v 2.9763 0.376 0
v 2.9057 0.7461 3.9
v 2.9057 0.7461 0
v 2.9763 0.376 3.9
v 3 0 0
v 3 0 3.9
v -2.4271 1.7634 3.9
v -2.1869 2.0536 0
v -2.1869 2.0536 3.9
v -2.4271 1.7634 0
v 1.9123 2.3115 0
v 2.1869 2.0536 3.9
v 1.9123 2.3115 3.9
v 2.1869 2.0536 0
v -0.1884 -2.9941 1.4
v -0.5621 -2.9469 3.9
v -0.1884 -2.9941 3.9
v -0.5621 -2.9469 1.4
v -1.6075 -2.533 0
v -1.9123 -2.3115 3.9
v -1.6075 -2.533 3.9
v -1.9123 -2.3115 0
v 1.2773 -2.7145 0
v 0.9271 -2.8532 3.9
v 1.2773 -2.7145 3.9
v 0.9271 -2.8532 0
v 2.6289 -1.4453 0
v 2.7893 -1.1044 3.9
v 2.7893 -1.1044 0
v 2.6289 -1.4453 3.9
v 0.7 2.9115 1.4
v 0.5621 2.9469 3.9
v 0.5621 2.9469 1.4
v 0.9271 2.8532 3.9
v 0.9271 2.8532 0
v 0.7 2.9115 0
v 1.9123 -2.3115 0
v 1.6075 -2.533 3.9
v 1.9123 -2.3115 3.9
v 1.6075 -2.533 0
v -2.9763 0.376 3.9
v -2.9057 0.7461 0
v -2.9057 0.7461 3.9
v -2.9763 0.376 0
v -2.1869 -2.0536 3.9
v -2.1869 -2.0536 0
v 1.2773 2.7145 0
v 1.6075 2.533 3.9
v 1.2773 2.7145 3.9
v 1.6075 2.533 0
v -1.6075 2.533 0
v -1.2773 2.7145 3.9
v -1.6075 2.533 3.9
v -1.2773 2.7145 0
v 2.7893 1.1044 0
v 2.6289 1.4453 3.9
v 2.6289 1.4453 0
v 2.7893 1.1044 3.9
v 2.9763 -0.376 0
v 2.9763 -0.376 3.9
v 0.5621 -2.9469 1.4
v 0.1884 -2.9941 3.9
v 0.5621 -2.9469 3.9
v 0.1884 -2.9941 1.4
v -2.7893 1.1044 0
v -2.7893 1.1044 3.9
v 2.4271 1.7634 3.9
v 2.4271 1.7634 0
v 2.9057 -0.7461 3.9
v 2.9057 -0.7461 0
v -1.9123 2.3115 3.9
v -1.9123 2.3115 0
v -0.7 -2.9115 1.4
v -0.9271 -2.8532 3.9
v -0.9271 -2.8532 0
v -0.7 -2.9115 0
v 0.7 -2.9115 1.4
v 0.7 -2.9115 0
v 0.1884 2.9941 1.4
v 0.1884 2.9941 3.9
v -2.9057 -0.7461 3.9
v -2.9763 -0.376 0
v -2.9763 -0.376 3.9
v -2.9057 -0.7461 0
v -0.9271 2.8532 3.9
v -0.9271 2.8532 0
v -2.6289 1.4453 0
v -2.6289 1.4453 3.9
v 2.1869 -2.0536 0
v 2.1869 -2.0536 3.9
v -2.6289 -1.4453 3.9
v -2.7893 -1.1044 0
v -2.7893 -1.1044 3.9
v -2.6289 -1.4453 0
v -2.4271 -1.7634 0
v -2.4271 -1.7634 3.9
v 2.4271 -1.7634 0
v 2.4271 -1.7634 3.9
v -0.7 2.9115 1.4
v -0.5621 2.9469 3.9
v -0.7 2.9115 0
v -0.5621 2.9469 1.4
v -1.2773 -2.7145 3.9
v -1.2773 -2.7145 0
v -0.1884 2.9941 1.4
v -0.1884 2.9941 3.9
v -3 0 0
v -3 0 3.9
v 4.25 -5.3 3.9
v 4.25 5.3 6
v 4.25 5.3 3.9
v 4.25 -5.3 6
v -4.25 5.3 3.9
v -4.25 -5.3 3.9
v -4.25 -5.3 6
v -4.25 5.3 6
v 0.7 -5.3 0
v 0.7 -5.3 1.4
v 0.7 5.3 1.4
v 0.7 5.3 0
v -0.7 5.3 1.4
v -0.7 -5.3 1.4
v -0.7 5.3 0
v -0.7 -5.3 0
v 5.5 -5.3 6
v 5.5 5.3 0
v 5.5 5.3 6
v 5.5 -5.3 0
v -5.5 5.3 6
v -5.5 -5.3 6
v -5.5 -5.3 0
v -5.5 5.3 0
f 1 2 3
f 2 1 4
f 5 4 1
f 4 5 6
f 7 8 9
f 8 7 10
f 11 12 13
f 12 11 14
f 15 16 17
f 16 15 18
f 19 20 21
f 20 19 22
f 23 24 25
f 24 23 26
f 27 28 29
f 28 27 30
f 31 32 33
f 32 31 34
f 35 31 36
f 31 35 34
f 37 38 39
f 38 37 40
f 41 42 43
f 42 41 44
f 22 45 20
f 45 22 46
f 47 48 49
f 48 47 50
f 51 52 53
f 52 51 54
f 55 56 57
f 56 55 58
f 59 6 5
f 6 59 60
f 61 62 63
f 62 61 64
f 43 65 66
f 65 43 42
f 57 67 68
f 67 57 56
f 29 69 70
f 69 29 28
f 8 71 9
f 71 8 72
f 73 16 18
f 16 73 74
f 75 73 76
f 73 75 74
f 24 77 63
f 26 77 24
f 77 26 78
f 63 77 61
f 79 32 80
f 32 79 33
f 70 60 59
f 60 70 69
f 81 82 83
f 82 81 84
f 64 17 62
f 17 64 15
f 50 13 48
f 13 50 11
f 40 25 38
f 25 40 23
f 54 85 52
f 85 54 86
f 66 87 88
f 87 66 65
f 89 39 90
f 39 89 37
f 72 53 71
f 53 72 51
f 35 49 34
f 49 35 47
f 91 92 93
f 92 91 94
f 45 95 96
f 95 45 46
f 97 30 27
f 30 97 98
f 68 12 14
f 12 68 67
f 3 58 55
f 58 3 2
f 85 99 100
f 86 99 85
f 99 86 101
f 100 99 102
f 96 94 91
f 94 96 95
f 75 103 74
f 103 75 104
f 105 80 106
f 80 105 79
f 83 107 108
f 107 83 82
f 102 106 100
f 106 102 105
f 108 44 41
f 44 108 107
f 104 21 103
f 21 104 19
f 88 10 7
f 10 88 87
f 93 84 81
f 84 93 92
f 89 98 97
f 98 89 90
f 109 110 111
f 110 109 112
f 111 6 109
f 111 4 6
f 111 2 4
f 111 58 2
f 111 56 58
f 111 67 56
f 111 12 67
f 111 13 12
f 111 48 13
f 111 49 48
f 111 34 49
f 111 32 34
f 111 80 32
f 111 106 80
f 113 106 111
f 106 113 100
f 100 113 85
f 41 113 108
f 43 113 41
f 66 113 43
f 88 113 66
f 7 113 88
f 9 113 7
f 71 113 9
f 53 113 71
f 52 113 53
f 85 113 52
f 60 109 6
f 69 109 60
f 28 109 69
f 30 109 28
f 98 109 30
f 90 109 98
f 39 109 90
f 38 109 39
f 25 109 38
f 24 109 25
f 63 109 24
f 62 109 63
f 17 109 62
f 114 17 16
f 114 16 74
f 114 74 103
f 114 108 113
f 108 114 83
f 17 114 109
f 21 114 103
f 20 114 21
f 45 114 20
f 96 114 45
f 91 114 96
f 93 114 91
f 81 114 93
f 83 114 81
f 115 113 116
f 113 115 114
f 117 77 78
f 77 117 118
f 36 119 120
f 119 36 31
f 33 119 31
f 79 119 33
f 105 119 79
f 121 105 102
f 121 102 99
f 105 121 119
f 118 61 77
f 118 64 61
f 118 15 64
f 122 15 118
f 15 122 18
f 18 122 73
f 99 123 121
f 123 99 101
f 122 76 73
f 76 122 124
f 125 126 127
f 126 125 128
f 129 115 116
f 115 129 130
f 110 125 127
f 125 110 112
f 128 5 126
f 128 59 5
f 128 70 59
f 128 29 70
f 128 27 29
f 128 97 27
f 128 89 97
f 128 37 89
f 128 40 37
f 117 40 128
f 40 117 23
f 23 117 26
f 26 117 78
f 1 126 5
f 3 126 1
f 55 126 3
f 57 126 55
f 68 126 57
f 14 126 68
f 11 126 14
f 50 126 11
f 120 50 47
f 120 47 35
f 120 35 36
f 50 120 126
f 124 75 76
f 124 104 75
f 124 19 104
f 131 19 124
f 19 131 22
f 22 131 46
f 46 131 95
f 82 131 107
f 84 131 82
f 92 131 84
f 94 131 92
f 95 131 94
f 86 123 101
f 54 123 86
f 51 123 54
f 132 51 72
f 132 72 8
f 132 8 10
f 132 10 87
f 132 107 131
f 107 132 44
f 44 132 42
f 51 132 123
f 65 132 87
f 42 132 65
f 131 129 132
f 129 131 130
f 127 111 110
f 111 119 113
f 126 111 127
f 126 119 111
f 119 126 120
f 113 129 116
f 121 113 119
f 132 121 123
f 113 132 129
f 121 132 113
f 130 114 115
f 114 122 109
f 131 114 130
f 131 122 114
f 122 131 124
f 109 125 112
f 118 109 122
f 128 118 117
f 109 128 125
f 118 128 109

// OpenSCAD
//
//  support for (non-standard) toggle switches FrSky Taranis
//

// switch threaded part diameter, standard is 6.2
switch_dia = 6.0; 

// switch body width, standard is 7.0
switch_width = 8.5;

frame_w = switch_width + 2.5;
frame_l = 1*10.6;

// height of support frame, 3.8 is standard
frame_height = 3.9;

slot = 1*1.4;

frame_t_height = frame_height + 2.1;

d = 1*0.01;

difference () {
	translate([-frame_w/2, -frame_l/2, 0]) cube([frame_w, frame_l, frame_t_height]);
	union () {
		
		translate([0,0,-d]) cylinder(r=switch_dia/2, h=frame_t_height+2*d, $fn=50);
		translate([-switch_width/2, -frame_l/2 - d, frame_height]) cube([switch_width, frame_l+2*d, frame_t_height]);
		translate([-slot/2, -frame_l/2 - d, -d]) cube([slot, frame_l+2*d, slot+d]);
	}
}



 
